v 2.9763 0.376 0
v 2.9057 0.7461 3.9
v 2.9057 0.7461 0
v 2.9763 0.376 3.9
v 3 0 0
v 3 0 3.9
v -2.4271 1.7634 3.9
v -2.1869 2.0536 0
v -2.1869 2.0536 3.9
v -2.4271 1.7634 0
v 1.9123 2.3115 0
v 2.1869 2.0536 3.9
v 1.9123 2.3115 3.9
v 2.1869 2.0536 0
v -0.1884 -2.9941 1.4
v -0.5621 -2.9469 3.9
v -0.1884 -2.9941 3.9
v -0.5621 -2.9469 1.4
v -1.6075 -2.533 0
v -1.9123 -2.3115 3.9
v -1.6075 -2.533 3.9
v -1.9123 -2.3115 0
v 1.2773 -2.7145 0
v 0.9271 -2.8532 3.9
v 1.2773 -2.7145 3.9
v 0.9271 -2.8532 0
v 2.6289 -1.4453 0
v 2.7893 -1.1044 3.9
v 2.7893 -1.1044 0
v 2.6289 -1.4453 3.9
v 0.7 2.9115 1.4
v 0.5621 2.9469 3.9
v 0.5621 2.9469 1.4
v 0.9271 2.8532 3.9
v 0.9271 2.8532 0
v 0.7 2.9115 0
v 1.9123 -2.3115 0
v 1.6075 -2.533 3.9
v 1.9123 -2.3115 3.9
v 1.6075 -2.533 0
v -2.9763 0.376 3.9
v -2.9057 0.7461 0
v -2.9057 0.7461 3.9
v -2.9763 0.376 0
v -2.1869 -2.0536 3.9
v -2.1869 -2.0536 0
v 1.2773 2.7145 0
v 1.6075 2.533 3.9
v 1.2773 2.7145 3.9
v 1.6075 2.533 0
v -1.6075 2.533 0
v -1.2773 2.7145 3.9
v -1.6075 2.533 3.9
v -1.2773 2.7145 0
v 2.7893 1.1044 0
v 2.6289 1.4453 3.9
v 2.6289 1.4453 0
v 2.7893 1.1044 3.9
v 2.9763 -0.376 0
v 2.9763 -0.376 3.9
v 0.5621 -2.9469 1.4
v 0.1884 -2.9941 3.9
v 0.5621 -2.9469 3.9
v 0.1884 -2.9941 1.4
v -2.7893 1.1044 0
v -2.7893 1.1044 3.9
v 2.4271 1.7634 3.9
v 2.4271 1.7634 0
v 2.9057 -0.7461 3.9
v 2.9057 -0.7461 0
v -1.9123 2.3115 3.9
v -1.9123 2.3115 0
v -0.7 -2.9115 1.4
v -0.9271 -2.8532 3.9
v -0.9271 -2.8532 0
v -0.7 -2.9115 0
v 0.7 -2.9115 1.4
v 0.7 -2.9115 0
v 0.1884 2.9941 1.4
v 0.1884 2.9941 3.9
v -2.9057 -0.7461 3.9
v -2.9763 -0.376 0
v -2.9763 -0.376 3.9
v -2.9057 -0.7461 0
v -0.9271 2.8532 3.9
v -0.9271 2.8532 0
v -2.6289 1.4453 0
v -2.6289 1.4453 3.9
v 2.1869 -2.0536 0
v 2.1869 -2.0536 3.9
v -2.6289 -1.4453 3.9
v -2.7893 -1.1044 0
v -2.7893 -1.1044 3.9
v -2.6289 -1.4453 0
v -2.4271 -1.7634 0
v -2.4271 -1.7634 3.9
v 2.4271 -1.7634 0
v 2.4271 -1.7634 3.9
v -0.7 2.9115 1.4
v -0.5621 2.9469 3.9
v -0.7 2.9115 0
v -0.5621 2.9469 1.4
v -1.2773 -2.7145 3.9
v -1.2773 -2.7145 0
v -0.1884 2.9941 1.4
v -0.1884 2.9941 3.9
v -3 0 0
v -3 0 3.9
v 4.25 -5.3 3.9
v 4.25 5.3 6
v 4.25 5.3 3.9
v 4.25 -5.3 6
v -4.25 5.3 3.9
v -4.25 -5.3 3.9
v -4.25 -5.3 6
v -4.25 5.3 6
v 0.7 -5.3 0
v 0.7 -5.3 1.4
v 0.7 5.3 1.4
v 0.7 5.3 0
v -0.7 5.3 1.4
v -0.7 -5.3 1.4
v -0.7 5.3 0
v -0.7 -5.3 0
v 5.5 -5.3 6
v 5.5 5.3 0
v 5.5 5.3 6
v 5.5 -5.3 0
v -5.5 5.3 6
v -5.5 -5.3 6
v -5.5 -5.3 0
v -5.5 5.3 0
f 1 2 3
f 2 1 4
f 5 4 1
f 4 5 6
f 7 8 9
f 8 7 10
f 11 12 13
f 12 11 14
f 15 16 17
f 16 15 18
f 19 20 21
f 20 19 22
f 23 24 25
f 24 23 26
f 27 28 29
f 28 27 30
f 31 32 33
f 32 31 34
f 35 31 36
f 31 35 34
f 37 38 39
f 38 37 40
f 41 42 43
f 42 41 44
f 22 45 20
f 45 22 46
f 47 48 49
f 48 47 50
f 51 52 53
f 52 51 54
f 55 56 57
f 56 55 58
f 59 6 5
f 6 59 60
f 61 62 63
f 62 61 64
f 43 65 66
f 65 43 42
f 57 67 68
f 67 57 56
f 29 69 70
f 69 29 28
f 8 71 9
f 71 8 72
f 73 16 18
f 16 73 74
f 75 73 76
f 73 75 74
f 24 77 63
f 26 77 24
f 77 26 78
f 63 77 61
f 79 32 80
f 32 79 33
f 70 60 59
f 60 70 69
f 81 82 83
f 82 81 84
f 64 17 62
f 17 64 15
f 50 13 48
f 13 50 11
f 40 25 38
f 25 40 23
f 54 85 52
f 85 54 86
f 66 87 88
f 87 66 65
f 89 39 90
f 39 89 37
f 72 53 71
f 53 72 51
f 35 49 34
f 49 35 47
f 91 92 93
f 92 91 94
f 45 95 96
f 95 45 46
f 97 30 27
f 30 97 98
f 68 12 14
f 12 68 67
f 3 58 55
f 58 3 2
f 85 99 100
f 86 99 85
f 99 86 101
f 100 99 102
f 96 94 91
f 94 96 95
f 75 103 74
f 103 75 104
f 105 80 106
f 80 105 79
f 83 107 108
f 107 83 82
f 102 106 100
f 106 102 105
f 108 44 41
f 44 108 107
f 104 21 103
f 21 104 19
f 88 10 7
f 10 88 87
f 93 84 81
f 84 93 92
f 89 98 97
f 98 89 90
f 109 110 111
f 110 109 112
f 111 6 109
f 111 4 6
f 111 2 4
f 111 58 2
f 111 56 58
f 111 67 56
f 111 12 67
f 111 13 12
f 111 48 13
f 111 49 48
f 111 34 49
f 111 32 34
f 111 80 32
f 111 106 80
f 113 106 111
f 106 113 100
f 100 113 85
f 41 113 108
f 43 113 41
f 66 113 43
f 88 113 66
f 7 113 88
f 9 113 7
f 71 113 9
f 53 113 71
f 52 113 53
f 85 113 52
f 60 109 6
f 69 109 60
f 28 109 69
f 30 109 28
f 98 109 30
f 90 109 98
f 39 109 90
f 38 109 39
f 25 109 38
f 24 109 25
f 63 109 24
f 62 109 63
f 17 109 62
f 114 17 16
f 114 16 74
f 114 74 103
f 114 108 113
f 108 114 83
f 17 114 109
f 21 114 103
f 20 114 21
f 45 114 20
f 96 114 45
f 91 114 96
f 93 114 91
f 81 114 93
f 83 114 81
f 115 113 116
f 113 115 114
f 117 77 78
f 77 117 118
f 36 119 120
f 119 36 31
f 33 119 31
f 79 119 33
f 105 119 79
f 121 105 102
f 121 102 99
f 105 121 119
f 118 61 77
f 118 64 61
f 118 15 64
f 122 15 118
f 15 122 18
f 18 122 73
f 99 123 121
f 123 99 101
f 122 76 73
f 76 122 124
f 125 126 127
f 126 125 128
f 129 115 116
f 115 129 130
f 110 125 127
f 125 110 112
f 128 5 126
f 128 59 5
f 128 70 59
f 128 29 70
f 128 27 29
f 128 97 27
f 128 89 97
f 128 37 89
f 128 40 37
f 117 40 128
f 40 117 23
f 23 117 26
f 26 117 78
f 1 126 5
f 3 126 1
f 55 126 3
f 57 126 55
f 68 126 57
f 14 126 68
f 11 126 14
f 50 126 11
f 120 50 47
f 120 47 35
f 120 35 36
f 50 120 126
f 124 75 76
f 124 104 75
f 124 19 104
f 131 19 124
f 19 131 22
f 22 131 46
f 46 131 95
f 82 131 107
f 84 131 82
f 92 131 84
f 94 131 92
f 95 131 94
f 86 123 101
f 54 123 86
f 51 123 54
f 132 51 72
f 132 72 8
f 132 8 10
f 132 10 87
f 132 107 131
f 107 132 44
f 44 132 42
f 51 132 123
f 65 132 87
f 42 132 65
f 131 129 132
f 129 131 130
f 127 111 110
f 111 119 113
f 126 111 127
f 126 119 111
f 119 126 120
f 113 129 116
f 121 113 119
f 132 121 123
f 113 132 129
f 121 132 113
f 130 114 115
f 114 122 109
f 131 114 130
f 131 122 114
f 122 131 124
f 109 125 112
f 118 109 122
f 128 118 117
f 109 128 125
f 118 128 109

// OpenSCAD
//
//  support for (non-standard) toggle switches FrSky Taranis
//

// switch threaded part diameter, standard is 6.2
switch_dia = 6.0; 

// switch body width, standard is 7.0
switch_width = 8.5;

frame_w = switch_width + 2.5;
frame_l = 1*10.6;

// height of support frame, 3.8 is standard
frame_height = 3.9;

slot = 1*1.4;

frame_t_height = frame_height + 2.1;

d = 1*0.01;

difference () {
	translate([-frame_w/2, -frame_l/2, 0]) cube([frame_w, frame_l, frame_t_height]);
	union () {
		
		translate([0,0,-d]) cylinder(r=switch_dia/2, h=frame_t_height+2*d, $fn=50);
		translate([-switch_width/2, -frame_l/2 - d, frame_height]) cube([switch_width, frame_l+2*d, frame_t_height]);
		translate([-slot/2, -frame_l/2 - d, -d]) cube([slot, frame_l+2*d, slot+d]);
	}
}



 
